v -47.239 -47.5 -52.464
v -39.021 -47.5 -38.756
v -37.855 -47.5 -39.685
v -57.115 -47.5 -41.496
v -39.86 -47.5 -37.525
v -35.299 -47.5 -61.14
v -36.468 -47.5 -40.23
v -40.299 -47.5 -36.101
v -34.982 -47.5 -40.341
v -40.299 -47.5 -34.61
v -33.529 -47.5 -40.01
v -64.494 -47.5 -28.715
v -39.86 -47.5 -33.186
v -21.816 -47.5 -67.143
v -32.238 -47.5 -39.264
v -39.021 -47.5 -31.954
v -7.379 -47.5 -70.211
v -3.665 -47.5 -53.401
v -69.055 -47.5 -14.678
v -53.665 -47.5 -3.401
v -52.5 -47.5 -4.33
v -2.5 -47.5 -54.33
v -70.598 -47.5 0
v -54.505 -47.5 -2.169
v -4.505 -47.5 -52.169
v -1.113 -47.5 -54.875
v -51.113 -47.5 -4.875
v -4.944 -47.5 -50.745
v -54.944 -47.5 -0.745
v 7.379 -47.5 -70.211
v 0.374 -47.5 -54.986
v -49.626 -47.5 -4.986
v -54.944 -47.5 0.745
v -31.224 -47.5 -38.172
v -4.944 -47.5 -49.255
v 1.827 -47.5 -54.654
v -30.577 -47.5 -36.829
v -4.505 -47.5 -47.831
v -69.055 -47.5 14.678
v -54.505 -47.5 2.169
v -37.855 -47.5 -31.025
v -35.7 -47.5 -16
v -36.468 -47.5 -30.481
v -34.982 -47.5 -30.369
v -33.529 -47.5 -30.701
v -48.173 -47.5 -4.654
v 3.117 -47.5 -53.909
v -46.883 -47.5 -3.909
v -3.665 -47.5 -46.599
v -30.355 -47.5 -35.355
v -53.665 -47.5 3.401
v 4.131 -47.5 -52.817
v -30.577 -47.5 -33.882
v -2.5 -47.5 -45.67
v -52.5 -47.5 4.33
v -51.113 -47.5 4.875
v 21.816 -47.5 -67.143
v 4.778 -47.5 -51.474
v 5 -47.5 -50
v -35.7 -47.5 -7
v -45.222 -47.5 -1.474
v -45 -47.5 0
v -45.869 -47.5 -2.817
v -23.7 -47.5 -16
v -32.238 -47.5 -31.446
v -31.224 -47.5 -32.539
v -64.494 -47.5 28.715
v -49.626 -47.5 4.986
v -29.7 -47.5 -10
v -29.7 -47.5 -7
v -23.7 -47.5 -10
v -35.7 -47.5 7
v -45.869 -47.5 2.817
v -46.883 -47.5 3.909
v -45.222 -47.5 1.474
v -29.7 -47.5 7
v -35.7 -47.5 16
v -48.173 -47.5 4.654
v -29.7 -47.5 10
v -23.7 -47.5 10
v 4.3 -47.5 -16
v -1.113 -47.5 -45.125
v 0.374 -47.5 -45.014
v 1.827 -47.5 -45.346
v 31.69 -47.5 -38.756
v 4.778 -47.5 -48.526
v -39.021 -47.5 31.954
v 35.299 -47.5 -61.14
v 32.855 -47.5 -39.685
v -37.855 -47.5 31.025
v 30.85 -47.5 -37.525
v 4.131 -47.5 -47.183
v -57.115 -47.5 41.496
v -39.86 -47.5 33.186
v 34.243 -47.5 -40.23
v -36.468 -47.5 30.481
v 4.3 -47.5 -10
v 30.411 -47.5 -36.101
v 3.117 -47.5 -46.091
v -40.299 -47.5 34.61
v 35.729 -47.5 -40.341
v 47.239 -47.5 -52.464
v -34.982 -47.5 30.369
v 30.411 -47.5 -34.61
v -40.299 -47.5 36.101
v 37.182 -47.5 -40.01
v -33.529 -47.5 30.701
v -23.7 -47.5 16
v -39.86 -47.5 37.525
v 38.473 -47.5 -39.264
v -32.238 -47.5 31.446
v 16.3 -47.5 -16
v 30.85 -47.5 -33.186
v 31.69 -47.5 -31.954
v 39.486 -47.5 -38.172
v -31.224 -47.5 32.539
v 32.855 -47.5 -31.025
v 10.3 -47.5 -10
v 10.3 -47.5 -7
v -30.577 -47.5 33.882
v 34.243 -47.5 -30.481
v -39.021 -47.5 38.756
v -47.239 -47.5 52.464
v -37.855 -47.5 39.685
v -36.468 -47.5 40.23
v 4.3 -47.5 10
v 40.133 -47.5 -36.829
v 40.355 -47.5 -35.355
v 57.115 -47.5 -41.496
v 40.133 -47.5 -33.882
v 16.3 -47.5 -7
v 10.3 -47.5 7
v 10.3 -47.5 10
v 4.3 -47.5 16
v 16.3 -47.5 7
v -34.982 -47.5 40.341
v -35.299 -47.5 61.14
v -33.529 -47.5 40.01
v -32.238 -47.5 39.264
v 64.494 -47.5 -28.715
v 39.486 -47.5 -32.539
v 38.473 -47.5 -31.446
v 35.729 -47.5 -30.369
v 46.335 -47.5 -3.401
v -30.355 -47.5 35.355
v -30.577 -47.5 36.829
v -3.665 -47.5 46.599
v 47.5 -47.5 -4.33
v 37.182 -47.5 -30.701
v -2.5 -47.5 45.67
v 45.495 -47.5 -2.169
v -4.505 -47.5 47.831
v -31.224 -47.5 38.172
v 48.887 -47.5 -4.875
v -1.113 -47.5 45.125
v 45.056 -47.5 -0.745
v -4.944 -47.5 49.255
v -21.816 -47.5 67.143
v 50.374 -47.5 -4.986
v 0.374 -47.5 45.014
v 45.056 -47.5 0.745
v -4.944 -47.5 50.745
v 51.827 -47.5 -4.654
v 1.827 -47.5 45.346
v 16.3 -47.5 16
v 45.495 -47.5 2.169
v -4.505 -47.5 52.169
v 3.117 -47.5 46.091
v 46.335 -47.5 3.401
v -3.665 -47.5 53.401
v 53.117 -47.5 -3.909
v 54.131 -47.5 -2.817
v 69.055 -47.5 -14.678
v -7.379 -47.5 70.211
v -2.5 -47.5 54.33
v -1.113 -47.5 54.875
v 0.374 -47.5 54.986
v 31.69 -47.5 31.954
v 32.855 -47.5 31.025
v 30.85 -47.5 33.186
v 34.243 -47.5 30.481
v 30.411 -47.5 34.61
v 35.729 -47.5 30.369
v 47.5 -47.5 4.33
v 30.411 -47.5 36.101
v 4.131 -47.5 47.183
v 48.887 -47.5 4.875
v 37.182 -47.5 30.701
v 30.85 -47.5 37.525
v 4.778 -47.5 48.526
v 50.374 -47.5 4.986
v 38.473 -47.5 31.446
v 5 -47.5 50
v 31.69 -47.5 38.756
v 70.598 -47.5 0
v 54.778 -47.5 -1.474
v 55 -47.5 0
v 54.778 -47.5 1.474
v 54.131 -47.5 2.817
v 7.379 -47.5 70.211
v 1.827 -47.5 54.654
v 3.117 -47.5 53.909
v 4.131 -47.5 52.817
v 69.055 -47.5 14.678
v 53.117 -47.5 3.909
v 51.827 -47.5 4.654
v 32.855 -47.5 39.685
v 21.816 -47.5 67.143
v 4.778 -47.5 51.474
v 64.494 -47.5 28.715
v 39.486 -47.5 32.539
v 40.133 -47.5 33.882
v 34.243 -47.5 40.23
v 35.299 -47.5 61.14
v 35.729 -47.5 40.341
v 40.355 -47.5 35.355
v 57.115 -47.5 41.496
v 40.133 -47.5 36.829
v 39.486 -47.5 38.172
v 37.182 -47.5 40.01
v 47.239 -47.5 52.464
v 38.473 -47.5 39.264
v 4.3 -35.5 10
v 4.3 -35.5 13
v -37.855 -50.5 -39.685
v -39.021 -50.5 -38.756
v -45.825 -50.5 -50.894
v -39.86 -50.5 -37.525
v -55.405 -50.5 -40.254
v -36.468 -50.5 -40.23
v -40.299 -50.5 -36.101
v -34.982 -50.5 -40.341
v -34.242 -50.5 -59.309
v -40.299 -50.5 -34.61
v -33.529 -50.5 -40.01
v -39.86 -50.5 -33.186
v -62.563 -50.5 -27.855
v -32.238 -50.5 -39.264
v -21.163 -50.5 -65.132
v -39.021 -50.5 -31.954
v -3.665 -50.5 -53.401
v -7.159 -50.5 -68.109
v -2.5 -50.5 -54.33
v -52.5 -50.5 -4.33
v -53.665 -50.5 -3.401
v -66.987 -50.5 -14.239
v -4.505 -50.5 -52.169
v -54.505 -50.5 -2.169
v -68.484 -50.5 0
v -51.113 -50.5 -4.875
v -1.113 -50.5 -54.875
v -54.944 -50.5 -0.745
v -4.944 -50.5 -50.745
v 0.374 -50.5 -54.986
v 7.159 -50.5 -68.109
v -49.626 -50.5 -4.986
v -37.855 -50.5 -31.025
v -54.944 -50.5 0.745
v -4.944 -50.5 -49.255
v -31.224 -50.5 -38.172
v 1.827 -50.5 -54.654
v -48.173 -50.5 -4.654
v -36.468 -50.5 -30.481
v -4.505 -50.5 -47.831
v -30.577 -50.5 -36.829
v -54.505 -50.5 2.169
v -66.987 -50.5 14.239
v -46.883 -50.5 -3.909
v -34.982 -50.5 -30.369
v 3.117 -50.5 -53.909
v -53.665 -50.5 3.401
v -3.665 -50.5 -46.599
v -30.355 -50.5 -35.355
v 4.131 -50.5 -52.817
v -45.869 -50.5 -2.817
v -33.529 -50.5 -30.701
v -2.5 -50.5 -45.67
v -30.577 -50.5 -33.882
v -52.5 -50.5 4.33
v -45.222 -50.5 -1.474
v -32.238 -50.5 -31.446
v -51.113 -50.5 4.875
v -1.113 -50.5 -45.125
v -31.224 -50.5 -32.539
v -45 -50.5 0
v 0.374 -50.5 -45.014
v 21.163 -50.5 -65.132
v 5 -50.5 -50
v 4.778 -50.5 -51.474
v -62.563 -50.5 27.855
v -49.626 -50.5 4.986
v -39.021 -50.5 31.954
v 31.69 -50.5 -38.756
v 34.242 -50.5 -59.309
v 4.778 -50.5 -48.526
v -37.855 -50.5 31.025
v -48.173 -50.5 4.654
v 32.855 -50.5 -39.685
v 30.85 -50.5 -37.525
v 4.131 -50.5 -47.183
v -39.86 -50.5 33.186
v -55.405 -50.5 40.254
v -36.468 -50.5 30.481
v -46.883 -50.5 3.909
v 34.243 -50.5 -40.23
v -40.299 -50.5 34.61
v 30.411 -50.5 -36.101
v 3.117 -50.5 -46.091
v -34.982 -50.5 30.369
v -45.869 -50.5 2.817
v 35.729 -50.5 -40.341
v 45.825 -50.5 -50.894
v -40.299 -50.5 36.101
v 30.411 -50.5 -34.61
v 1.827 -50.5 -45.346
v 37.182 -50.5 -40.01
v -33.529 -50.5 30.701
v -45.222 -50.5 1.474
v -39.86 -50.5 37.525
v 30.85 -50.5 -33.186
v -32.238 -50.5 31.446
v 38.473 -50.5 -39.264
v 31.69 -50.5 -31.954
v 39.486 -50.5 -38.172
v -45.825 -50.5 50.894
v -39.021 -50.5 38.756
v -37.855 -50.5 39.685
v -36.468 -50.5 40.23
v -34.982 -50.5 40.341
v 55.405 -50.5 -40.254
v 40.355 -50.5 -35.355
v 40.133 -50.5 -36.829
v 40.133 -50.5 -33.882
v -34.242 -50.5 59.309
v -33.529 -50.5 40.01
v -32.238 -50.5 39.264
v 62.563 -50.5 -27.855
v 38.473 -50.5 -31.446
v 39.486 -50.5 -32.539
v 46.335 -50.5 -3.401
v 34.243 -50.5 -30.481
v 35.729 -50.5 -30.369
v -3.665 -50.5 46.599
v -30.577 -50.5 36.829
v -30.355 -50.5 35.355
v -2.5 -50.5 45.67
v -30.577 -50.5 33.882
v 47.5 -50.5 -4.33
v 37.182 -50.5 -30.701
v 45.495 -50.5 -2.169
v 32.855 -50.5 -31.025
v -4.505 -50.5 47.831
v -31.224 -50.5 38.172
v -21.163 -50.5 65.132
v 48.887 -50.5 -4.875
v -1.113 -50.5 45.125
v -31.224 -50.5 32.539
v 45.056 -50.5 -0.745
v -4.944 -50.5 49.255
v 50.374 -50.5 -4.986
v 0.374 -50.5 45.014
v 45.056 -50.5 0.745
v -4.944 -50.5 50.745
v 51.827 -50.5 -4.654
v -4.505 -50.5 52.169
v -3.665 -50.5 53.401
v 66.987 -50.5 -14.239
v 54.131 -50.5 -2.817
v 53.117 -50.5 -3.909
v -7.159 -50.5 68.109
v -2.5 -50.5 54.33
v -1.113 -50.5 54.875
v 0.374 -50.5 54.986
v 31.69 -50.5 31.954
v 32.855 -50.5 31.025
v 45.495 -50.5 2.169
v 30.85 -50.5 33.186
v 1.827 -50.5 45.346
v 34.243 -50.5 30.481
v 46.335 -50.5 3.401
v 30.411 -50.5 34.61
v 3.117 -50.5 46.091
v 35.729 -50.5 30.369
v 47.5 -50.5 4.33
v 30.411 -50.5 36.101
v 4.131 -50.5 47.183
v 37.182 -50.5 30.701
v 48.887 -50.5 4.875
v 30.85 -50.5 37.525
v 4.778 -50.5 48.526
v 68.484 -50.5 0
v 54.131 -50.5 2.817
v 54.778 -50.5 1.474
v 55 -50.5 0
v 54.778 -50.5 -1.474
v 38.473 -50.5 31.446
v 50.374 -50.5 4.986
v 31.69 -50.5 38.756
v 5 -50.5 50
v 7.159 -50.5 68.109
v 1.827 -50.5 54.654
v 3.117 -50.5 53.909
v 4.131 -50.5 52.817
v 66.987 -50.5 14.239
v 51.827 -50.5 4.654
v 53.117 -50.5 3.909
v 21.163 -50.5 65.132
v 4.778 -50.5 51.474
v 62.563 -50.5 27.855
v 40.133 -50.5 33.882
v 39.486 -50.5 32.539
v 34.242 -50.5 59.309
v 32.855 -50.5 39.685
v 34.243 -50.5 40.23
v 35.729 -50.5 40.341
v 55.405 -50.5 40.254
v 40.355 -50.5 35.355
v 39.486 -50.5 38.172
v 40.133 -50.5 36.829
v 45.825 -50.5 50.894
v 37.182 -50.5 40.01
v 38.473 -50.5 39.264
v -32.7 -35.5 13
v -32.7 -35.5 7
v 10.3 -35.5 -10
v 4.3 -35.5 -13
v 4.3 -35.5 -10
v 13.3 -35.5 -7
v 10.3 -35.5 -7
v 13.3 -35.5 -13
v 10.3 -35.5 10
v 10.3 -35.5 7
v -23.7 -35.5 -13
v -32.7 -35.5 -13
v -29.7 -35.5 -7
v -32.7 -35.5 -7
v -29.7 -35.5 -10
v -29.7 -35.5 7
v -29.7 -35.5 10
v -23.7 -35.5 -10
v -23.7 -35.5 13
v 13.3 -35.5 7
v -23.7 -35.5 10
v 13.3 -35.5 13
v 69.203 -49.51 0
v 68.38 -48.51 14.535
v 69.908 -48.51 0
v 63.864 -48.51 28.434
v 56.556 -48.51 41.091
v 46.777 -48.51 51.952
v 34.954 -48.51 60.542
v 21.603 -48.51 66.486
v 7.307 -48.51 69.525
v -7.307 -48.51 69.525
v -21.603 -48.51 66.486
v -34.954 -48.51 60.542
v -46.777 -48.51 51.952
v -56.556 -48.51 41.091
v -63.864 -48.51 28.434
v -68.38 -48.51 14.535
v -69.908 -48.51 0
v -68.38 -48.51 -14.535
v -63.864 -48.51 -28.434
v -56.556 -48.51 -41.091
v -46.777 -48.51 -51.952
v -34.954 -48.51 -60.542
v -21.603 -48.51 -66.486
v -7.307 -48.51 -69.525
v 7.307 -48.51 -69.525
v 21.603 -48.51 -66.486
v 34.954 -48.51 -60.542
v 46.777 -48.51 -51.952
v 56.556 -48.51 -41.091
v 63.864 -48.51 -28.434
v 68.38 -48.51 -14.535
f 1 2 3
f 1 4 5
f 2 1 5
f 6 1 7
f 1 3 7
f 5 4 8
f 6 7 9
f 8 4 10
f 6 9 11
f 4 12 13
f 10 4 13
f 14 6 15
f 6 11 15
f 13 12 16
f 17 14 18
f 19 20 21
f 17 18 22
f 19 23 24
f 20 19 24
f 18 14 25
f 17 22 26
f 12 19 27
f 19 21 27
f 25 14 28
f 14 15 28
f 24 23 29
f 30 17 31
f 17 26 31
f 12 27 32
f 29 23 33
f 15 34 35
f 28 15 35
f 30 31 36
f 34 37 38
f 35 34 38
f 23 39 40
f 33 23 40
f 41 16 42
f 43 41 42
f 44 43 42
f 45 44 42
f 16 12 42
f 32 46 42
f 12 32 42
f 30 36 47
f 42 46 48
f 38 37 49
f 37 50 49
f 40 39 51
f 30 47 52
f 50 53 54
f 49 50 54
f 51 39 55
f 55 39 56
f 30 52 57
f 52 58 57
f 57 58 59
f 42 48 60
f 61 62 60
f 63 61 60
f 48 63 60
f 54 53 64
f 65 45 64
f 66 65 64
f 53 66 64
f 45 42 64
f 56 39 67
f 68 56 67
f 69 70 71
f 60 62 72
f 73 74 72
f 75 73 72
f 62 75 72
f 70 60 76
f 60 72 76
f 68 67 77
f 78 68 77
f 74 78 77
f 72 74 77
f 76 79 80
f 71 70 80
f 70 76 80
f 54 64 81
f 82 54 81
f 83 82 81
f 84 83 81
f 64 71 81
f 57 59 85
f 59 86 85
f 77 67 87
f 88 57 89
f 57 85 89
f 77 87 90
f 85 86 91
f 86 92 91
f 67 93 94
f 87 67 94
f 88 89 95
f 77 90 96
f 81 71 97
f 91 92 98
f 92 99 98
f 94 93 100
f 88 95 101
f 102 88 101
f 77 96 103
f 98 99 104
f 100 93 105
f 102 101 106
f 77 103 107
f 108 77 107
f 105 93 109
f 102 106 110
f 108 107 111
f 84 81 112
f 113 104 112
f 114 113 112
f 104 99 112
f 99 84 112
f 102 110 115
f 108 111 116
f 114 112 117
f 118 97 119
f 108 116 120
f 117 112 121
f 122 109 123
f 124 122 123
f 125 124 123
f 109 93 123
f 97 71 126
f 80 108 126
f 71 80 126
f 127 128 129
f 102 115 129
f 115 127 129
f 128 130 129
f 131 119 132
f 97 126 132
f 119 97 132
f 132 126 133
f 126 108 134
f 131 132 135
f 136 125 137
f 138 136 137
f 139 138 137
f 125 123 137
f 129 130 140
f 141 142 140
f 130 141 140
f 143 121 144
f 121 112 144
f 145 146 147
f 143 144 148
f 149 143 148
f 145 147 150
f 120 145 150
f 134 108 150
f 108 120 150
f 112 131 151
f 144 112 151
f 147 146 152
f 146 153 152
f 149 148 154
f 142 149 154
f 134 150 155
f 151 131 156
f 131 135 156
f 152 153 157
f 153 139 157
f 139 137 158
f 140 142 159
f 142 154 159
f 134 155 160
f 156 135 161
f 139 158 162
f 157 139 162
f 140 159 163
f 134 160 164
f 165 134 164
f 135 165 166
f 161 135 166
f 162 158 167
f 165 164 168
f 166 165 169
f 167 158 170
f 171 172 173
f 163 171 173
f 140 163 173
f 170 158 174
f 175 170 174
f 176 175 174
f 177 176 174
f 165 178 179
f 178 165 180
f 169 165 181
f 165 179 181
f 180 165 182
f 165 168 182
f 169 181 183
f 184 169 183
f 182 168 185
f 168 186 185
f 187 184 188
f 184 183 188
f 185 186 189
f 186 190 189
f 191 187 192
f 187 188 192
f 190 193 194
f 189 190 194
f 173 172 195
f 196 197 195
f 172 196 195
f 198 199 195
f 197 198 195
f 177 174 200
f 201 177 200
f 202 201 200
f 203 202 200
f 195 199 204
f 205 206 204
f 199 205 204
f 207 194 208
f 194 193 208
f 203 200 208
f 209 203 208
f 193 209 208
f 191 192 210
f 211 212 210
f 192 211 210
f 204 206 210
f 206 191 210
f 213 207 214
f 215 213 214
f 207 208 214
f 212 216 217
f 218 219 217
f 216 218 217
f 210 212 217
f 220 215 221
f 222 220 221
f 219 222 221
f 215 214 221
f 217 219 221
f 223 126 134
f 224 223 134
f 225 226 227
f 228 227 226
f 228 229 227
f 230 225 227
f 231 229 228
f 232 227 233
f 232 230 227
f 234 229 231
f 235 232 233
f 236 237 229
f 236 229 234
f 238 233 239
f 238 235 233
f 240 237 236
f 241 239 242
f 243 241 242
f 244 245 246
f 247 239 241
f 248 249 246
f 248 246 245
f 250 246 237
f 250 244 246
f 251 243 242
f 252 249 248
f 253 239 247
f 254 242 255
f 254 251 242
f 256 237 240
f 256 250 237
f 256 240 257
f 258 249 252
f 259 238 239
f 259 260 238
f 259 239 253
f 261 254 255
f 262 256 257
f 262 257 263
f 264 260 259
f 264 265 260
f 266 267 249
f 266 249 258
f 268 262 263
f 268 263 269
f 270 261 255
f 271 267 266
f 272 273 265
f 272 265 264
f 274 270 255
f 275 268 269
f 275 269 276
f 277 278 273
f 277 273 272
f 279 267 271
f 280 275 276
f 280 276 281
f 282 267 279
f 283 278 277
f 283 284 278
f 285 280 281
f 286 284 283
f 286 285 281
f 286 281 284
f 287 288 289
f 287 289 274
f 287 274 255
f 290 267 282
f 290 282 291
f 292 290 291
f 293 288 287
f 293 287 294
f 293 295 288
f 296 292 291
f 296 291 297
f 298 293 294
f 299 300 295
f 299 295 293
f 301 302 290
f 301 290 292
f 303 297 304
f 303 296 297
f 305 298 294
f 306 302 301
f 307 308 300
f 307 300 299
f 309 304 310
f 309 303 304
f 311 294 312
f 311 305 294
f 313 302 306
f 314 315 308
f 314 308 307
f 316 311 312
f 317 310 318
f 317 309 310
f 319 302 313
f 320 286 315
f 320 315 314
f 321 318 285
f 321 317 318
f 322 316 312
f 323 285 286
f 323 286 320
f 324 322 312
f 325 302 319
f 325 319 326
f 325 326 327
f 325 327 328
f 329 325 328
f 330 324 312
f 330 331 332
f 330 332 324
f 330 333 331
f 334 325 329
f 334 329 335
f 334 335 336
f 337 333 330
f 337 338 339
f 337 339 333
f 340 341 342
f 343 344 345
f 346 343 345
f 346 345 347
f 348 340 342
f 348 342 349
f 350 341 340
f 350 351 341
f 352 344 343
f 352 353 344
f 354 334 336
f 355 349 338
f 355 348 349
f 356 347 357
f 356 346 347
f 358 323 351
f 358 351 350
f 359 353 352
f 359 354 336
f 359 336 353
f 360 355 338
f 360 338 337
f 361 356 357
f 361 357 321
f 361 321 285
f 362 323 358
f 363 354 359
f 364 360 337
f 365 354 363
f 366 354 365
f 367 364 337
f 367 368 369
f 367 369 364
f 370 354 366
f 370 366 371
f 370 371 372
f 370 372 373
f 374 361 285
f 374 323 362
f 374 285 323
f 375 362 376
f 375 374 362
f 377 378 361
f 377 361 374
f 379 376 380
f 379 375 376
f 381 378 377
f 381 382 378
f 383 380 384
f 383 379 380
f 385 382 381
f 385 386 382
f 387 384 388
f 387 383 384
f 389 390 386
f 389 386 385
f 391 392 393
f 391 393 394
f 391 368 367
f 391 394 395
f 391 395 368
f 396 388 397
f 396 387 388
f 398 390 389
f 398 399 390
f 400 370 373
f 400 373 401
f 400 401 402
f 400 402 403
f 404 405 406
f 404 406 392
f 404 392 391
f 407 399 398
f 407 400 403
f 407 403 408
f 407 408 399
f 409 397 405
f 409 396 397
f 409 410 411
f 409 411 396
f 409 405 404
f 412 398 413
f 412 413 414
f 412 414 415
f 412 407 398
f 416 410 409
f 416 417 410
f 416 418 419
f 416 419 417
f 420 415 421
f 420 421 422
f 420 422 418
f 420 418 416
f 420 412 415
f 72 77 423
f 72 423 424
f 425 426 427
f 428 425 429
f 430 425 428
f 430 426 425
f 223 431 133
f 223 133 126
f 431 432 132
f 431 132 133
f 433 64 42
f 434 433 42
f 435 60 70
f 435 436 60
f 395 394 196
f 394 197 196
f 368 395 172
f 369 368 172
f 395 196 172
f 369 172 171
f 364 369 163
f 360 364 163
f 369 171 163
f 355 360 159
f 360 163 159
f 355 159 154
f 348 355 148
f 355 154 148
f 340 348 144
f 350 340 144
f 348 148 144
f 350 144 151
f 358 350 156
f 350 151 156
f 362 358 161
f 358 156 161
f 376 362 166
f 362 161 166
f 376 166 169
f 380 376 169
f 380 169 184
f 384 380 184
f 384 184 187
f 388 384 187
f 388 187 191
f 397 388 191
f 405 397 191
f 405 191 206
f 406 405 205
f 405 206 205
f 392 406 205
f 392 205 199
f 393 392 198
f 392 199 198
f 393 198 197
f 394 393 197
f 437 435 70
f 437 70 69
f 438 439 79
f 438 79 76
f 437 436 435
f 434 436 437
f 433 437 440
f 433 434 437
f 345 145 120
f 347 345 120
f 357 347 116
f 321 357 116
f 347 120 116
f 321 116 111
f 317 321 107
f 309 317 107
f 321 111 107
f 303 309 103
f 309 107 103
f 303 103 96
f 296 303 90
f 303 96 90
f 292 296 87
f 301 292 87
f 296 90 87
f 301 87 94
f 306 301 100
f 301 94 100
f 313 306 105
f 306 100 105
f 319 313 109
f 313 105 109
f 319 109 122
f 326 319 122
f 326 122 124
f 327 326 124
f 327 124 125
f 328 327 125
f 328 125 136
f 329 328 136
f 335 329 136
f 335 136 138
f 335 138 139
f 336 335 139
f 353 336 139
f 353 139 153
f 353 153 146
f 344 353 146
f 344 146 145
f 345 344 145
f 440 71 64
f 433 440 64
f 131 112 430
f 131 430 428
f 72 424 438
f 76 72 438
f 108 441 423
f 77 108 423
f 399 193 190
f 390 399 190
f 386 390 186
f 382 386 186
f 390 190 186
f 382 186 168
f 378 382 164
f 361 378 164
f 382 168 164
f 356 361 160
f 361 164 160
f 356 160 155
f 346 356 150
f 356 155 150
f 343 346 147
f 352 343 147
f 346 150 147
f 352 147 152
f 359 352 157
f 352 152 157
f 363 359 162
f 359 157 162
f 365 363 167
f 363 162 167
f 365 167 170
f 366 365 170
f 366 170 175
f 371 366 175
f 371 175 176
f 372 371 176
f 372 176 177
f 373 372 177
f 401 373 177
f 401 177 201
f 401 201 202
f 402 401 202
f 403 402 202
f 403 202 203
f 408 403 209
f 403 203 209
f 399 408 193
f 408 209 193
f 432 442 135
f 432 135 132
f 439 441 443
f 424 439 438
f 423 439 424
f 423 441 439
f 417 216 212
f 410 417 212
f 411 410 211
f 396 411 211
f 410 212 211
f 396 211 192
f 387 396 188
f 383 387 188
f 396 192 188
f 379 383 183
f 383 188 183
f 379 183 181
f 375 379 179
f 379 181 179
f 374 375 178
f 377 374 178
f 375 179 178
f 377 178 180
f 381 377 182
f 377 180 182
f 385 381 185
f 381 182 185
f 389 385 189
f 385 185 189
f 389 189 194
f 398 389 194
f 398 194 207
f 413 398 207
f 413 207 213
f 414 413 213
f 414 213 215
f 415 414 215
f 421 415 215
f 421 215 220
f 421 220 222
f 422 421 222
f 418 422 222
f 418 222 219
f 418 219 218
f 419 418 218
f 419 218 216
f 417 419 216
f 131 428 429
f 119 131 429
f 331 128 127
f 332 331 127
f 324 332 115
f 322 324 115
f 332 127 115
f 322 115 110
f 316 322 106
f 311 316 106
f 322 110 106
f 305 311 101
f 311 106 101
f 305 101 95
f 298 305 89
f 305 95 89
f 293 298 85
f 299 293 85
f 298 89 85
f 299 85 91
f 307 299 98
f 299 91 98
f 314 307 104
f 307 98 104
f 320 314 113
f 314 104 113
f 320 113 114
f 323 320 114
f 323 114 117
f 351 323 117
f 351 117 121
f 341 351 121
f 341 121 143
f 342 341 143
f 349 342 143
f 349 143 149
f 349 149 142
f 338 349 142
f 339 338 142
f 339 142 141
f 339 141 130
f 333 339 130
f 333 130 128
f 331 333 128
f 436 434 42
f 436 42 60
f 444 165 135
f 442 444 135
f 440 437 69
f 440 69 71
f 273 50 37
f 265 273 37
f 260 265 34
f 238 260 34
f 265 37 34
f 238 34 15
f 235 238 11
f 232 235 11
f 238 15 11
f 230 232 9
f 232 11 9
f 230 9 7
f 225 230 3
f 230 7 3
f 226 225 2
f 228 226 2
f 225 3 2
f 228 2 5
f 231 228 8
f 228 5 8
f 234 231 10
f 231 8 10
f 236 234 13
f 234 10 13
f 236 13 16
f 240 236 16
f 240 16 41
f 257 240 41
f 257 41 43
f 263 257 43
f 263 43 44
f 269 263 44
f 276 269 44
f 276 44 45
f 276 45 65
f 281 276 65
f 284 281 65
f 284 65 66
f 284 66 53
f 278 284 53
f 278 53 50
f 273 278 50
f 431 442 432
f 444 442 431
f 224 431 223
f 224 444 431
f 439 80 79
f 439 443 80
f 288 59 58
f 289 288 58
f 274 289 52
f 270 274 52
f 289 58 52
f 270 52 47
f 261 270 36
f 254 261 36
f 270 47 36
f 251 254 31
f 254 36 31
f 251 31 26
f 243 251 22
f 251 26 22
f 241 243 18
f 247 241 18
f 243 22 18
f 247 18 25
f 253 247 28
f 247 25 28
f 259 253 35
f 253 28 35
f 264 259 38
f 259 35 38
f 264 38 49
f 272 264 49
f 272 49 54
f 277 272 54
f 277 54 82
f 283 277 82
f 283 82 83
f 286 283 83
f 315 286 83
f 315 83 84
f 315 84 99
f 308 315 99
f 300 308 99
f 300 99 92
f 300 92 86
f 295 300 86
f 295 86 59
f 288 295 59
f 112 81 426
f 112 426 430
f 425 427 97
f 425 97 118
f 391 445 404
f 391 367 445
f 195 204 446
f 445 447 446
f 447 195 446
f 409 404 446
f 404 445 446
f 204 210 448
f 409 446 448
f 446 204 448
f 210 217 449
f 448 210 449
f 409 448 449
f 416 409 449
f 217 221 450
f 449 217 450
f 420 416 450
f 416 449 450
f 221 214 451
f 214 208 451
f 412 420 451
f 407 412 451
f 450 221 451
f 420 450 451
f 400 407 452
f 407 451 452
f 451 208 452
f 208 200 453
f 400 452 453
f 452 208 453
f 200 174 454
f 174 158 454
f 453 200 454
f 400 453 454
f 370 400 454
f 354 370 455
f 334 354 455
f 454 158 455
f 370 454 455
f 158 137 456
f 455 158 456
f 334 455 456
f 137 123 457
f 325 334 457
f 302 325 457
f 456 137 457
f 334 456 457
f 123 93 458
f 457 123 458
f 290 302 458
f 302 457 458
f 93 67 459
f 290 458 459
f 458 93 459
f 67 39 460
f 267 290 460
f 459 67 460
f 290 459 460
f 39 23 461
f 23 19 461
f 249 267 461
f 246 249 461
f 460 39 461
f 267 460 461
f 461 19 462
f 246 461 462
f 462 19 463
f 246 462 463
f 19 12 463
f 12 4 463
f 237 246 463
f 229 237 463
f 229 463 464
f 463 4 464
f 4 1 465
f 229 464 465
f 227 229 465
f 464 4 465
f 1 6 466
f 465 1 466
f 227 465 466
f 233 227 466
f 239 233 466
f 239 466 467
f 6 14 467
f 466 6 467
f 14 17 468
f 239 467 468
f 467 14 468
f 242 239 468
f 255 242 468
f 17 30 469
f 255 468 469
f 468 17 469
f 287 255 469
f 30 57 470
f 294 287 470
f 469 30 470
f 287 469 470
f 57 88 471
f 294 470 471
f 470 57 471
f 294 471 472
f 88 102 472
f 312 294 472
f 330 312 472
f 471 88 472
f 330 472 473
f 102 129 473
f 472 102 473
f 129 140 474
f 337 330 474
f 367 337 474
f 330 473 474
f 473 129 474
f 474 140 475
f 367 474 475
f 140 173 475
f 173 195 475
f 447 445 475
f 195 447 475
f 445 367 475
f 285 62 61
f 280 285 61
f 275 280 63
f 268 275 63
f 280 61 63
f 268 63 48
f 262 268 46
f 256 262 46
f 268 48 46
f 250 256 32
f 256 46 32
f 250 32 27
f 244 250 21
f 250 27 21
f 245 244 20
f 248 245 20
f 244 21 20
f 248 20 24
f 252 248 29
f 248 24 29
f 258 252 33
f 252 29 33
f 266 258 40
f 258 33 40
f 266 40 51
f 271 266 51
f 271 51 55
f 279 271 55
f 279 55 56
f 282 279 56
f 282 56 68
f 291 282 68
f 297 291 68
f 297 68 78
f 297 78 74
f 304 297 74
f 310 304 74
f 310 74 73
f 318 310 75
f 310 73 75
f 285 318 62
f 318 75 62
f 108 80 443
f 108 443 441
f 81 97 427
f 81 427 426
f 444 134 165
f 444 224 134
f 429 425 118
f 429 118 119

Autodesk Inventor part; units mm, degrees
sketch "Sketch1" plane through (0, 0, 0) normal (0, 0, 1) x (1, 0, 0)
  arc A0 (68.484, -50.5) -> (70.5979, -47.5) centre (0, 0) ccw
  line L0 (0, -47.5) -> (70.5979, -47.5)
  line L1 (0, -47.5) -> (0, -50.5)
  line L2 (0, -50.5) -> (68.484, -50.5)
  dimension "d0" = 170.18
  dimension "d1" = 37.59
  dimension "d13" = 3
revolve "Revolution1" add sketch "Sketch1" angle 360 about axis through (0, -47.5, 0) along (0, -1, 0)
ref_plane "Work Plane1" through (0, -35.5, 0) normal (0, 1, 0) x (1, 0, 0)
sketch "Sketch2" plane through (0, -35.5, 0) normal (0, 1, 0) x (1, 0, 0)
  line L0 (10.3, -10) -> (-29.7, -10) construction
  line L1 (-29.7, -10) -> (-29.7, 10) construction
  line L2 (-29.7, 10) -> (10.3, 10) construction
  line L3 (10.3, 10) -> (10.3, -10) construction
  line L4 (0, 0) -> (-20, 0) construction
  line L5 (10.3, 10) -> (10.3, 7)
  line L6 (10.3, 7) -> (13.3, 7)
  line L7 (13.3, 7) -> (13.3, 13)
  line L8 (13.3, 13) -> (4.3, 13)
  line L9 (4.3, 13) -> (4.3, 10)
  line L10 (10.3, 10) -> (4.3, 10)
  line L11 (-9.7, 10) -> (-9.7, -10) construction
  line L12 (-19.4, 0) -> (0.6, 0) construction
  line L13 (-29.7, 10) -> (-29.7, 7)
  line L14 (-29.7, 7) -> (-32.7, 7)
  line L15 (-32.7, 7) -> (-32.7, 13)
  line L16 (-32.7, 13) -> (-23.7, 13)
  line L17 (-23.7, 13) -> (-23.7, 10)
  line L18 (-29.7, 10) -> (-23.7, 10)
  line L19 (10.3, -10) -> (10.3, -7)
  line L20 (10.3, -7) -> (13.3, -7)
  line L21 (13.3, -7) -> (13.3, -13)
  line L22 (13.3, -13) -> (4.3, -13)
  line L23 (4.3, -13) -> (4.3, -10)
  line L24 (10.3, -10) -> (4.3, -10)
  line L25 (-29.7, -10) -> (-29.7, -7)
  line L26 (-23.7, -13) -> (-23.7, -10)
  line L27 (-32.7, -13) -> (-23.7, -13)
  line L28 (-29.7, -7) -> (-32.7, -7)
  line L29 (-32.7, -7) -> (-32.7, -13)
  line L30 (-29.7, -10) -> (-23.7, -10)
  dimension "d3" = 40
  dimension "d4" = 20
  dimension "d5" = 20
  dimension "d6" = 29.7
  dimension "d7" = 3
  dimension "d8" = 3
  dimension "d9" = 6
  dimension "d10" = 9
sketch "Sketch4" plane through (0, 0, 0) normal (0, 0, 1) x (1, 0, 0)
  arc A0 (0, -85.09) -> (85.09, 0) centre (0, 0) ccw
  line L0 (0, -85.09) -> (0, 0) construction
  line L1 (0, 0) -> (85.09, 0) construction
  dimension "d28" = 170.18
surface revolve "RevolutionSrf1" sketch "Sketch4" angle 360 about axis through (0, -85.09, 0) along (0, 1, 0) shown yes curves A0
sketch "Sketch5" plane through (0, -47.5, 0) normal (0, 1, 0) x (1, 0, 0)
  circle A0 centre (-50, 0) radius 5
  circle A1 centre (-35.3553, -35.3553) radius 5
  circle A2 centre (0, -50) radius 5
  circle A3 centre (35.3553, -35.3553) radius 5
  circle A4 centre (50, 0) radius 5
  circle A5 centre (35.3553, 35.3553) radius 5
  circle A6 centre (0, 50) radius 5
  circle A7 centre (-35.3553, 35.3553) radius 5
  point P0 (0, 0)
  dimension "d38" = 10
  dimension "d39" = 50
  dimension "d42" = 360
extrude "Extrusion3" cut sketch "Sketch5" against normal through all
sketch "Sketch6" plane through (0, -47.5, 0) normal (0, 1, 0) x (1, 0, 0)
  line L0 (-23.7, 10) -> (-29.7, 10)
  line L1 (-23.7, 10) -> (-23.7, 16)
  line L2 (-23.7, 16) -> (-35.7, 16)
  line L3 (-35.7, 16) -> (-35.7, 7)
  line L4 (-29.7, 7) -> (-29.7, 10)
  line L5 (-35.7, 7) -> (-29.7, 7)
  line L6 (-29.7, 7) -> (-29.7, 10)
  line L7 (-9.7, 10) -> (-9.7, -10) construction
  line L8 (-19.4, 0) -> (0.6, 0) construction
  point P0 (0, 0)
  dimension "d46" = 6
  dimension "d47" = 12
  dimension "d48" = 9
  dimension "d49" = 90
sketch "Sketch7" plane through (0, -35.5, 0) normal (0, 1, 0) x (1, 0, 0)
  line L0 (-29.7, 10) -> (-23.7, 10)
  line L1 (-23.7, 10) -> (-23.7, 13)
  line L2 (-23.7, 13) -> (-32.7, 13)
  line L3 (-32.7, 13) -> (-32.7, 7)
  line L4 (-32.7, 7) -> (-29.7, 7)
  line L5 (-29.7, 7) -> (-29.7, 10)
  point P0 (0, 0)
  dimension "d51" = 6
  dimension "d52" = 3
  dimension "d53" = 90
  dimension "d54" = 9
  dimension "d55" = 90
  dimension "d56" = 6
  dimension "d57" = 3
sketch "Sketch8" plane through (0, -35.5, 0) normal (0, 1, 0) x (1, 0, 0)
  point P0 (0, 0)
loft "Loft1" add profiles "Sketch6", "Sketch7"
ref_plane "Work Plane2" through (-9.7, -35.5, -10) normal (-1, 0, 0) x (0, 0, 1)
ref_plane "Work Plane3" through (-19.4, -35.5, 0) normal (0, 0, 1) x (1, 0, 0)
mirror "Mirror1" about plane through (-9.7, -35.5, -10) normal (-1, 0, 0) of "Loft1"
mirror "Mirror2" about plane through (-19.4, -35.5, 0) normal (0, 0, 1) of "Loft1", "Mirror1"
properties part number "bottom_platform"
